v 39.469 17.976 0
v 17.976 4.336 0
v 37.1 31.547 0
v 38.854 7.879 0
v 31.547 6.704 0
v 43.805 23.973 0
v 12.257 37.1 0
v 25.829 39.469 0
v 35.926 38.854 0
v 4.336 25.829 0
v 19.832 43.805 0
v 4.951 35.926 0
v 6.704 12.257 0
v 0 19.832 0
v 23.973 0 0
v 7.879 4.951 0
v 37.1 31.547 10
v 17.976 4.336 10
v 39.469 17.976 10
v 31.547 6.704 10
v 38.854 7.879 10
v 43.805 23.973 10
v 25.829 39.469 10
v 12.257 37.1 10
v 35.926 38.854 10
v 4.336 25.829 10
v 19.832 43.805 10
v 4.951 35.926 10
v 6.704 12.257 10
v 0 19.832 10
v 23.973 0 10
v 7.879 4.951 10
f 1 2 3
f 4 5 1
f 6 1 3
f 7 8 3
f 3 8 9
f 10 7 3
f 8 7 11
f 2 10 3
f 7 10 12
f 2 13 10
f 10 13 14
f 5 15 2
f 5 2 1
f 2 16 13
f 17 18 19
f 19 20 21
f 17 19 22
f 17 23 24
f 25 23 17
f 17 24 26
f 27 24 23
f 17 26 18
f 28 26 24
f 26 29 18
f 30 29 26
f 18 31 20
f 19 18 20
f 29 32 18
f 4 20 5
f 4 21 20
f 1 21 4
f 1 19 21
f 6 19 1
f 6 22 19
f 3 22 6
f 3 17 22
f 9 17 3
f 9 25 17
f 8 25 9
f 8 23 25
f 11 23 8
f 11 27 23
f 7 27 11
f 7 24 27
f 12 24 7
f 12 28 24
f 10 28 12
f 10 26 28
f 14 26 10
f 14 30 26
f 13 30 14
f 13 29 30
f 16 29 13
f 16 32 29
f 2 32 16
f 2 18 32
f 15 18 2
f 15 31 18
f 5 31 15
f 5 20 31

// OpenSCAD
$fn = 32;

// ----------------------------------------------------------------------
// Chain sprocket: 8 teeth, 18 mm root radius
// ----------------------------------------------------------------------

// --- parameters (mm) ---
profile_height = 10;      // extrusion height
profile_points = 16;      // points of the closed outline

profile = [[39.469, 17.976], [43.805, 23.973], [37.1, 31.547], [35.926, 38.854], [25.829, 39.469], [19.832, 43.805], [12.257, 37.1], [4.951, 35.926], [4.336, 25.829], [0, 19.832], [6.704, 12.257], [7.879, 4.951], [17.976, 4.336], [23.973, 0], [31.547, 6.704], [38.854, 7.879]];  // single closed polygon, 16 points, counter clockwise

// --- the one profile operation ---
linear_extrude(height = profile_height) polygon(points = profile);
